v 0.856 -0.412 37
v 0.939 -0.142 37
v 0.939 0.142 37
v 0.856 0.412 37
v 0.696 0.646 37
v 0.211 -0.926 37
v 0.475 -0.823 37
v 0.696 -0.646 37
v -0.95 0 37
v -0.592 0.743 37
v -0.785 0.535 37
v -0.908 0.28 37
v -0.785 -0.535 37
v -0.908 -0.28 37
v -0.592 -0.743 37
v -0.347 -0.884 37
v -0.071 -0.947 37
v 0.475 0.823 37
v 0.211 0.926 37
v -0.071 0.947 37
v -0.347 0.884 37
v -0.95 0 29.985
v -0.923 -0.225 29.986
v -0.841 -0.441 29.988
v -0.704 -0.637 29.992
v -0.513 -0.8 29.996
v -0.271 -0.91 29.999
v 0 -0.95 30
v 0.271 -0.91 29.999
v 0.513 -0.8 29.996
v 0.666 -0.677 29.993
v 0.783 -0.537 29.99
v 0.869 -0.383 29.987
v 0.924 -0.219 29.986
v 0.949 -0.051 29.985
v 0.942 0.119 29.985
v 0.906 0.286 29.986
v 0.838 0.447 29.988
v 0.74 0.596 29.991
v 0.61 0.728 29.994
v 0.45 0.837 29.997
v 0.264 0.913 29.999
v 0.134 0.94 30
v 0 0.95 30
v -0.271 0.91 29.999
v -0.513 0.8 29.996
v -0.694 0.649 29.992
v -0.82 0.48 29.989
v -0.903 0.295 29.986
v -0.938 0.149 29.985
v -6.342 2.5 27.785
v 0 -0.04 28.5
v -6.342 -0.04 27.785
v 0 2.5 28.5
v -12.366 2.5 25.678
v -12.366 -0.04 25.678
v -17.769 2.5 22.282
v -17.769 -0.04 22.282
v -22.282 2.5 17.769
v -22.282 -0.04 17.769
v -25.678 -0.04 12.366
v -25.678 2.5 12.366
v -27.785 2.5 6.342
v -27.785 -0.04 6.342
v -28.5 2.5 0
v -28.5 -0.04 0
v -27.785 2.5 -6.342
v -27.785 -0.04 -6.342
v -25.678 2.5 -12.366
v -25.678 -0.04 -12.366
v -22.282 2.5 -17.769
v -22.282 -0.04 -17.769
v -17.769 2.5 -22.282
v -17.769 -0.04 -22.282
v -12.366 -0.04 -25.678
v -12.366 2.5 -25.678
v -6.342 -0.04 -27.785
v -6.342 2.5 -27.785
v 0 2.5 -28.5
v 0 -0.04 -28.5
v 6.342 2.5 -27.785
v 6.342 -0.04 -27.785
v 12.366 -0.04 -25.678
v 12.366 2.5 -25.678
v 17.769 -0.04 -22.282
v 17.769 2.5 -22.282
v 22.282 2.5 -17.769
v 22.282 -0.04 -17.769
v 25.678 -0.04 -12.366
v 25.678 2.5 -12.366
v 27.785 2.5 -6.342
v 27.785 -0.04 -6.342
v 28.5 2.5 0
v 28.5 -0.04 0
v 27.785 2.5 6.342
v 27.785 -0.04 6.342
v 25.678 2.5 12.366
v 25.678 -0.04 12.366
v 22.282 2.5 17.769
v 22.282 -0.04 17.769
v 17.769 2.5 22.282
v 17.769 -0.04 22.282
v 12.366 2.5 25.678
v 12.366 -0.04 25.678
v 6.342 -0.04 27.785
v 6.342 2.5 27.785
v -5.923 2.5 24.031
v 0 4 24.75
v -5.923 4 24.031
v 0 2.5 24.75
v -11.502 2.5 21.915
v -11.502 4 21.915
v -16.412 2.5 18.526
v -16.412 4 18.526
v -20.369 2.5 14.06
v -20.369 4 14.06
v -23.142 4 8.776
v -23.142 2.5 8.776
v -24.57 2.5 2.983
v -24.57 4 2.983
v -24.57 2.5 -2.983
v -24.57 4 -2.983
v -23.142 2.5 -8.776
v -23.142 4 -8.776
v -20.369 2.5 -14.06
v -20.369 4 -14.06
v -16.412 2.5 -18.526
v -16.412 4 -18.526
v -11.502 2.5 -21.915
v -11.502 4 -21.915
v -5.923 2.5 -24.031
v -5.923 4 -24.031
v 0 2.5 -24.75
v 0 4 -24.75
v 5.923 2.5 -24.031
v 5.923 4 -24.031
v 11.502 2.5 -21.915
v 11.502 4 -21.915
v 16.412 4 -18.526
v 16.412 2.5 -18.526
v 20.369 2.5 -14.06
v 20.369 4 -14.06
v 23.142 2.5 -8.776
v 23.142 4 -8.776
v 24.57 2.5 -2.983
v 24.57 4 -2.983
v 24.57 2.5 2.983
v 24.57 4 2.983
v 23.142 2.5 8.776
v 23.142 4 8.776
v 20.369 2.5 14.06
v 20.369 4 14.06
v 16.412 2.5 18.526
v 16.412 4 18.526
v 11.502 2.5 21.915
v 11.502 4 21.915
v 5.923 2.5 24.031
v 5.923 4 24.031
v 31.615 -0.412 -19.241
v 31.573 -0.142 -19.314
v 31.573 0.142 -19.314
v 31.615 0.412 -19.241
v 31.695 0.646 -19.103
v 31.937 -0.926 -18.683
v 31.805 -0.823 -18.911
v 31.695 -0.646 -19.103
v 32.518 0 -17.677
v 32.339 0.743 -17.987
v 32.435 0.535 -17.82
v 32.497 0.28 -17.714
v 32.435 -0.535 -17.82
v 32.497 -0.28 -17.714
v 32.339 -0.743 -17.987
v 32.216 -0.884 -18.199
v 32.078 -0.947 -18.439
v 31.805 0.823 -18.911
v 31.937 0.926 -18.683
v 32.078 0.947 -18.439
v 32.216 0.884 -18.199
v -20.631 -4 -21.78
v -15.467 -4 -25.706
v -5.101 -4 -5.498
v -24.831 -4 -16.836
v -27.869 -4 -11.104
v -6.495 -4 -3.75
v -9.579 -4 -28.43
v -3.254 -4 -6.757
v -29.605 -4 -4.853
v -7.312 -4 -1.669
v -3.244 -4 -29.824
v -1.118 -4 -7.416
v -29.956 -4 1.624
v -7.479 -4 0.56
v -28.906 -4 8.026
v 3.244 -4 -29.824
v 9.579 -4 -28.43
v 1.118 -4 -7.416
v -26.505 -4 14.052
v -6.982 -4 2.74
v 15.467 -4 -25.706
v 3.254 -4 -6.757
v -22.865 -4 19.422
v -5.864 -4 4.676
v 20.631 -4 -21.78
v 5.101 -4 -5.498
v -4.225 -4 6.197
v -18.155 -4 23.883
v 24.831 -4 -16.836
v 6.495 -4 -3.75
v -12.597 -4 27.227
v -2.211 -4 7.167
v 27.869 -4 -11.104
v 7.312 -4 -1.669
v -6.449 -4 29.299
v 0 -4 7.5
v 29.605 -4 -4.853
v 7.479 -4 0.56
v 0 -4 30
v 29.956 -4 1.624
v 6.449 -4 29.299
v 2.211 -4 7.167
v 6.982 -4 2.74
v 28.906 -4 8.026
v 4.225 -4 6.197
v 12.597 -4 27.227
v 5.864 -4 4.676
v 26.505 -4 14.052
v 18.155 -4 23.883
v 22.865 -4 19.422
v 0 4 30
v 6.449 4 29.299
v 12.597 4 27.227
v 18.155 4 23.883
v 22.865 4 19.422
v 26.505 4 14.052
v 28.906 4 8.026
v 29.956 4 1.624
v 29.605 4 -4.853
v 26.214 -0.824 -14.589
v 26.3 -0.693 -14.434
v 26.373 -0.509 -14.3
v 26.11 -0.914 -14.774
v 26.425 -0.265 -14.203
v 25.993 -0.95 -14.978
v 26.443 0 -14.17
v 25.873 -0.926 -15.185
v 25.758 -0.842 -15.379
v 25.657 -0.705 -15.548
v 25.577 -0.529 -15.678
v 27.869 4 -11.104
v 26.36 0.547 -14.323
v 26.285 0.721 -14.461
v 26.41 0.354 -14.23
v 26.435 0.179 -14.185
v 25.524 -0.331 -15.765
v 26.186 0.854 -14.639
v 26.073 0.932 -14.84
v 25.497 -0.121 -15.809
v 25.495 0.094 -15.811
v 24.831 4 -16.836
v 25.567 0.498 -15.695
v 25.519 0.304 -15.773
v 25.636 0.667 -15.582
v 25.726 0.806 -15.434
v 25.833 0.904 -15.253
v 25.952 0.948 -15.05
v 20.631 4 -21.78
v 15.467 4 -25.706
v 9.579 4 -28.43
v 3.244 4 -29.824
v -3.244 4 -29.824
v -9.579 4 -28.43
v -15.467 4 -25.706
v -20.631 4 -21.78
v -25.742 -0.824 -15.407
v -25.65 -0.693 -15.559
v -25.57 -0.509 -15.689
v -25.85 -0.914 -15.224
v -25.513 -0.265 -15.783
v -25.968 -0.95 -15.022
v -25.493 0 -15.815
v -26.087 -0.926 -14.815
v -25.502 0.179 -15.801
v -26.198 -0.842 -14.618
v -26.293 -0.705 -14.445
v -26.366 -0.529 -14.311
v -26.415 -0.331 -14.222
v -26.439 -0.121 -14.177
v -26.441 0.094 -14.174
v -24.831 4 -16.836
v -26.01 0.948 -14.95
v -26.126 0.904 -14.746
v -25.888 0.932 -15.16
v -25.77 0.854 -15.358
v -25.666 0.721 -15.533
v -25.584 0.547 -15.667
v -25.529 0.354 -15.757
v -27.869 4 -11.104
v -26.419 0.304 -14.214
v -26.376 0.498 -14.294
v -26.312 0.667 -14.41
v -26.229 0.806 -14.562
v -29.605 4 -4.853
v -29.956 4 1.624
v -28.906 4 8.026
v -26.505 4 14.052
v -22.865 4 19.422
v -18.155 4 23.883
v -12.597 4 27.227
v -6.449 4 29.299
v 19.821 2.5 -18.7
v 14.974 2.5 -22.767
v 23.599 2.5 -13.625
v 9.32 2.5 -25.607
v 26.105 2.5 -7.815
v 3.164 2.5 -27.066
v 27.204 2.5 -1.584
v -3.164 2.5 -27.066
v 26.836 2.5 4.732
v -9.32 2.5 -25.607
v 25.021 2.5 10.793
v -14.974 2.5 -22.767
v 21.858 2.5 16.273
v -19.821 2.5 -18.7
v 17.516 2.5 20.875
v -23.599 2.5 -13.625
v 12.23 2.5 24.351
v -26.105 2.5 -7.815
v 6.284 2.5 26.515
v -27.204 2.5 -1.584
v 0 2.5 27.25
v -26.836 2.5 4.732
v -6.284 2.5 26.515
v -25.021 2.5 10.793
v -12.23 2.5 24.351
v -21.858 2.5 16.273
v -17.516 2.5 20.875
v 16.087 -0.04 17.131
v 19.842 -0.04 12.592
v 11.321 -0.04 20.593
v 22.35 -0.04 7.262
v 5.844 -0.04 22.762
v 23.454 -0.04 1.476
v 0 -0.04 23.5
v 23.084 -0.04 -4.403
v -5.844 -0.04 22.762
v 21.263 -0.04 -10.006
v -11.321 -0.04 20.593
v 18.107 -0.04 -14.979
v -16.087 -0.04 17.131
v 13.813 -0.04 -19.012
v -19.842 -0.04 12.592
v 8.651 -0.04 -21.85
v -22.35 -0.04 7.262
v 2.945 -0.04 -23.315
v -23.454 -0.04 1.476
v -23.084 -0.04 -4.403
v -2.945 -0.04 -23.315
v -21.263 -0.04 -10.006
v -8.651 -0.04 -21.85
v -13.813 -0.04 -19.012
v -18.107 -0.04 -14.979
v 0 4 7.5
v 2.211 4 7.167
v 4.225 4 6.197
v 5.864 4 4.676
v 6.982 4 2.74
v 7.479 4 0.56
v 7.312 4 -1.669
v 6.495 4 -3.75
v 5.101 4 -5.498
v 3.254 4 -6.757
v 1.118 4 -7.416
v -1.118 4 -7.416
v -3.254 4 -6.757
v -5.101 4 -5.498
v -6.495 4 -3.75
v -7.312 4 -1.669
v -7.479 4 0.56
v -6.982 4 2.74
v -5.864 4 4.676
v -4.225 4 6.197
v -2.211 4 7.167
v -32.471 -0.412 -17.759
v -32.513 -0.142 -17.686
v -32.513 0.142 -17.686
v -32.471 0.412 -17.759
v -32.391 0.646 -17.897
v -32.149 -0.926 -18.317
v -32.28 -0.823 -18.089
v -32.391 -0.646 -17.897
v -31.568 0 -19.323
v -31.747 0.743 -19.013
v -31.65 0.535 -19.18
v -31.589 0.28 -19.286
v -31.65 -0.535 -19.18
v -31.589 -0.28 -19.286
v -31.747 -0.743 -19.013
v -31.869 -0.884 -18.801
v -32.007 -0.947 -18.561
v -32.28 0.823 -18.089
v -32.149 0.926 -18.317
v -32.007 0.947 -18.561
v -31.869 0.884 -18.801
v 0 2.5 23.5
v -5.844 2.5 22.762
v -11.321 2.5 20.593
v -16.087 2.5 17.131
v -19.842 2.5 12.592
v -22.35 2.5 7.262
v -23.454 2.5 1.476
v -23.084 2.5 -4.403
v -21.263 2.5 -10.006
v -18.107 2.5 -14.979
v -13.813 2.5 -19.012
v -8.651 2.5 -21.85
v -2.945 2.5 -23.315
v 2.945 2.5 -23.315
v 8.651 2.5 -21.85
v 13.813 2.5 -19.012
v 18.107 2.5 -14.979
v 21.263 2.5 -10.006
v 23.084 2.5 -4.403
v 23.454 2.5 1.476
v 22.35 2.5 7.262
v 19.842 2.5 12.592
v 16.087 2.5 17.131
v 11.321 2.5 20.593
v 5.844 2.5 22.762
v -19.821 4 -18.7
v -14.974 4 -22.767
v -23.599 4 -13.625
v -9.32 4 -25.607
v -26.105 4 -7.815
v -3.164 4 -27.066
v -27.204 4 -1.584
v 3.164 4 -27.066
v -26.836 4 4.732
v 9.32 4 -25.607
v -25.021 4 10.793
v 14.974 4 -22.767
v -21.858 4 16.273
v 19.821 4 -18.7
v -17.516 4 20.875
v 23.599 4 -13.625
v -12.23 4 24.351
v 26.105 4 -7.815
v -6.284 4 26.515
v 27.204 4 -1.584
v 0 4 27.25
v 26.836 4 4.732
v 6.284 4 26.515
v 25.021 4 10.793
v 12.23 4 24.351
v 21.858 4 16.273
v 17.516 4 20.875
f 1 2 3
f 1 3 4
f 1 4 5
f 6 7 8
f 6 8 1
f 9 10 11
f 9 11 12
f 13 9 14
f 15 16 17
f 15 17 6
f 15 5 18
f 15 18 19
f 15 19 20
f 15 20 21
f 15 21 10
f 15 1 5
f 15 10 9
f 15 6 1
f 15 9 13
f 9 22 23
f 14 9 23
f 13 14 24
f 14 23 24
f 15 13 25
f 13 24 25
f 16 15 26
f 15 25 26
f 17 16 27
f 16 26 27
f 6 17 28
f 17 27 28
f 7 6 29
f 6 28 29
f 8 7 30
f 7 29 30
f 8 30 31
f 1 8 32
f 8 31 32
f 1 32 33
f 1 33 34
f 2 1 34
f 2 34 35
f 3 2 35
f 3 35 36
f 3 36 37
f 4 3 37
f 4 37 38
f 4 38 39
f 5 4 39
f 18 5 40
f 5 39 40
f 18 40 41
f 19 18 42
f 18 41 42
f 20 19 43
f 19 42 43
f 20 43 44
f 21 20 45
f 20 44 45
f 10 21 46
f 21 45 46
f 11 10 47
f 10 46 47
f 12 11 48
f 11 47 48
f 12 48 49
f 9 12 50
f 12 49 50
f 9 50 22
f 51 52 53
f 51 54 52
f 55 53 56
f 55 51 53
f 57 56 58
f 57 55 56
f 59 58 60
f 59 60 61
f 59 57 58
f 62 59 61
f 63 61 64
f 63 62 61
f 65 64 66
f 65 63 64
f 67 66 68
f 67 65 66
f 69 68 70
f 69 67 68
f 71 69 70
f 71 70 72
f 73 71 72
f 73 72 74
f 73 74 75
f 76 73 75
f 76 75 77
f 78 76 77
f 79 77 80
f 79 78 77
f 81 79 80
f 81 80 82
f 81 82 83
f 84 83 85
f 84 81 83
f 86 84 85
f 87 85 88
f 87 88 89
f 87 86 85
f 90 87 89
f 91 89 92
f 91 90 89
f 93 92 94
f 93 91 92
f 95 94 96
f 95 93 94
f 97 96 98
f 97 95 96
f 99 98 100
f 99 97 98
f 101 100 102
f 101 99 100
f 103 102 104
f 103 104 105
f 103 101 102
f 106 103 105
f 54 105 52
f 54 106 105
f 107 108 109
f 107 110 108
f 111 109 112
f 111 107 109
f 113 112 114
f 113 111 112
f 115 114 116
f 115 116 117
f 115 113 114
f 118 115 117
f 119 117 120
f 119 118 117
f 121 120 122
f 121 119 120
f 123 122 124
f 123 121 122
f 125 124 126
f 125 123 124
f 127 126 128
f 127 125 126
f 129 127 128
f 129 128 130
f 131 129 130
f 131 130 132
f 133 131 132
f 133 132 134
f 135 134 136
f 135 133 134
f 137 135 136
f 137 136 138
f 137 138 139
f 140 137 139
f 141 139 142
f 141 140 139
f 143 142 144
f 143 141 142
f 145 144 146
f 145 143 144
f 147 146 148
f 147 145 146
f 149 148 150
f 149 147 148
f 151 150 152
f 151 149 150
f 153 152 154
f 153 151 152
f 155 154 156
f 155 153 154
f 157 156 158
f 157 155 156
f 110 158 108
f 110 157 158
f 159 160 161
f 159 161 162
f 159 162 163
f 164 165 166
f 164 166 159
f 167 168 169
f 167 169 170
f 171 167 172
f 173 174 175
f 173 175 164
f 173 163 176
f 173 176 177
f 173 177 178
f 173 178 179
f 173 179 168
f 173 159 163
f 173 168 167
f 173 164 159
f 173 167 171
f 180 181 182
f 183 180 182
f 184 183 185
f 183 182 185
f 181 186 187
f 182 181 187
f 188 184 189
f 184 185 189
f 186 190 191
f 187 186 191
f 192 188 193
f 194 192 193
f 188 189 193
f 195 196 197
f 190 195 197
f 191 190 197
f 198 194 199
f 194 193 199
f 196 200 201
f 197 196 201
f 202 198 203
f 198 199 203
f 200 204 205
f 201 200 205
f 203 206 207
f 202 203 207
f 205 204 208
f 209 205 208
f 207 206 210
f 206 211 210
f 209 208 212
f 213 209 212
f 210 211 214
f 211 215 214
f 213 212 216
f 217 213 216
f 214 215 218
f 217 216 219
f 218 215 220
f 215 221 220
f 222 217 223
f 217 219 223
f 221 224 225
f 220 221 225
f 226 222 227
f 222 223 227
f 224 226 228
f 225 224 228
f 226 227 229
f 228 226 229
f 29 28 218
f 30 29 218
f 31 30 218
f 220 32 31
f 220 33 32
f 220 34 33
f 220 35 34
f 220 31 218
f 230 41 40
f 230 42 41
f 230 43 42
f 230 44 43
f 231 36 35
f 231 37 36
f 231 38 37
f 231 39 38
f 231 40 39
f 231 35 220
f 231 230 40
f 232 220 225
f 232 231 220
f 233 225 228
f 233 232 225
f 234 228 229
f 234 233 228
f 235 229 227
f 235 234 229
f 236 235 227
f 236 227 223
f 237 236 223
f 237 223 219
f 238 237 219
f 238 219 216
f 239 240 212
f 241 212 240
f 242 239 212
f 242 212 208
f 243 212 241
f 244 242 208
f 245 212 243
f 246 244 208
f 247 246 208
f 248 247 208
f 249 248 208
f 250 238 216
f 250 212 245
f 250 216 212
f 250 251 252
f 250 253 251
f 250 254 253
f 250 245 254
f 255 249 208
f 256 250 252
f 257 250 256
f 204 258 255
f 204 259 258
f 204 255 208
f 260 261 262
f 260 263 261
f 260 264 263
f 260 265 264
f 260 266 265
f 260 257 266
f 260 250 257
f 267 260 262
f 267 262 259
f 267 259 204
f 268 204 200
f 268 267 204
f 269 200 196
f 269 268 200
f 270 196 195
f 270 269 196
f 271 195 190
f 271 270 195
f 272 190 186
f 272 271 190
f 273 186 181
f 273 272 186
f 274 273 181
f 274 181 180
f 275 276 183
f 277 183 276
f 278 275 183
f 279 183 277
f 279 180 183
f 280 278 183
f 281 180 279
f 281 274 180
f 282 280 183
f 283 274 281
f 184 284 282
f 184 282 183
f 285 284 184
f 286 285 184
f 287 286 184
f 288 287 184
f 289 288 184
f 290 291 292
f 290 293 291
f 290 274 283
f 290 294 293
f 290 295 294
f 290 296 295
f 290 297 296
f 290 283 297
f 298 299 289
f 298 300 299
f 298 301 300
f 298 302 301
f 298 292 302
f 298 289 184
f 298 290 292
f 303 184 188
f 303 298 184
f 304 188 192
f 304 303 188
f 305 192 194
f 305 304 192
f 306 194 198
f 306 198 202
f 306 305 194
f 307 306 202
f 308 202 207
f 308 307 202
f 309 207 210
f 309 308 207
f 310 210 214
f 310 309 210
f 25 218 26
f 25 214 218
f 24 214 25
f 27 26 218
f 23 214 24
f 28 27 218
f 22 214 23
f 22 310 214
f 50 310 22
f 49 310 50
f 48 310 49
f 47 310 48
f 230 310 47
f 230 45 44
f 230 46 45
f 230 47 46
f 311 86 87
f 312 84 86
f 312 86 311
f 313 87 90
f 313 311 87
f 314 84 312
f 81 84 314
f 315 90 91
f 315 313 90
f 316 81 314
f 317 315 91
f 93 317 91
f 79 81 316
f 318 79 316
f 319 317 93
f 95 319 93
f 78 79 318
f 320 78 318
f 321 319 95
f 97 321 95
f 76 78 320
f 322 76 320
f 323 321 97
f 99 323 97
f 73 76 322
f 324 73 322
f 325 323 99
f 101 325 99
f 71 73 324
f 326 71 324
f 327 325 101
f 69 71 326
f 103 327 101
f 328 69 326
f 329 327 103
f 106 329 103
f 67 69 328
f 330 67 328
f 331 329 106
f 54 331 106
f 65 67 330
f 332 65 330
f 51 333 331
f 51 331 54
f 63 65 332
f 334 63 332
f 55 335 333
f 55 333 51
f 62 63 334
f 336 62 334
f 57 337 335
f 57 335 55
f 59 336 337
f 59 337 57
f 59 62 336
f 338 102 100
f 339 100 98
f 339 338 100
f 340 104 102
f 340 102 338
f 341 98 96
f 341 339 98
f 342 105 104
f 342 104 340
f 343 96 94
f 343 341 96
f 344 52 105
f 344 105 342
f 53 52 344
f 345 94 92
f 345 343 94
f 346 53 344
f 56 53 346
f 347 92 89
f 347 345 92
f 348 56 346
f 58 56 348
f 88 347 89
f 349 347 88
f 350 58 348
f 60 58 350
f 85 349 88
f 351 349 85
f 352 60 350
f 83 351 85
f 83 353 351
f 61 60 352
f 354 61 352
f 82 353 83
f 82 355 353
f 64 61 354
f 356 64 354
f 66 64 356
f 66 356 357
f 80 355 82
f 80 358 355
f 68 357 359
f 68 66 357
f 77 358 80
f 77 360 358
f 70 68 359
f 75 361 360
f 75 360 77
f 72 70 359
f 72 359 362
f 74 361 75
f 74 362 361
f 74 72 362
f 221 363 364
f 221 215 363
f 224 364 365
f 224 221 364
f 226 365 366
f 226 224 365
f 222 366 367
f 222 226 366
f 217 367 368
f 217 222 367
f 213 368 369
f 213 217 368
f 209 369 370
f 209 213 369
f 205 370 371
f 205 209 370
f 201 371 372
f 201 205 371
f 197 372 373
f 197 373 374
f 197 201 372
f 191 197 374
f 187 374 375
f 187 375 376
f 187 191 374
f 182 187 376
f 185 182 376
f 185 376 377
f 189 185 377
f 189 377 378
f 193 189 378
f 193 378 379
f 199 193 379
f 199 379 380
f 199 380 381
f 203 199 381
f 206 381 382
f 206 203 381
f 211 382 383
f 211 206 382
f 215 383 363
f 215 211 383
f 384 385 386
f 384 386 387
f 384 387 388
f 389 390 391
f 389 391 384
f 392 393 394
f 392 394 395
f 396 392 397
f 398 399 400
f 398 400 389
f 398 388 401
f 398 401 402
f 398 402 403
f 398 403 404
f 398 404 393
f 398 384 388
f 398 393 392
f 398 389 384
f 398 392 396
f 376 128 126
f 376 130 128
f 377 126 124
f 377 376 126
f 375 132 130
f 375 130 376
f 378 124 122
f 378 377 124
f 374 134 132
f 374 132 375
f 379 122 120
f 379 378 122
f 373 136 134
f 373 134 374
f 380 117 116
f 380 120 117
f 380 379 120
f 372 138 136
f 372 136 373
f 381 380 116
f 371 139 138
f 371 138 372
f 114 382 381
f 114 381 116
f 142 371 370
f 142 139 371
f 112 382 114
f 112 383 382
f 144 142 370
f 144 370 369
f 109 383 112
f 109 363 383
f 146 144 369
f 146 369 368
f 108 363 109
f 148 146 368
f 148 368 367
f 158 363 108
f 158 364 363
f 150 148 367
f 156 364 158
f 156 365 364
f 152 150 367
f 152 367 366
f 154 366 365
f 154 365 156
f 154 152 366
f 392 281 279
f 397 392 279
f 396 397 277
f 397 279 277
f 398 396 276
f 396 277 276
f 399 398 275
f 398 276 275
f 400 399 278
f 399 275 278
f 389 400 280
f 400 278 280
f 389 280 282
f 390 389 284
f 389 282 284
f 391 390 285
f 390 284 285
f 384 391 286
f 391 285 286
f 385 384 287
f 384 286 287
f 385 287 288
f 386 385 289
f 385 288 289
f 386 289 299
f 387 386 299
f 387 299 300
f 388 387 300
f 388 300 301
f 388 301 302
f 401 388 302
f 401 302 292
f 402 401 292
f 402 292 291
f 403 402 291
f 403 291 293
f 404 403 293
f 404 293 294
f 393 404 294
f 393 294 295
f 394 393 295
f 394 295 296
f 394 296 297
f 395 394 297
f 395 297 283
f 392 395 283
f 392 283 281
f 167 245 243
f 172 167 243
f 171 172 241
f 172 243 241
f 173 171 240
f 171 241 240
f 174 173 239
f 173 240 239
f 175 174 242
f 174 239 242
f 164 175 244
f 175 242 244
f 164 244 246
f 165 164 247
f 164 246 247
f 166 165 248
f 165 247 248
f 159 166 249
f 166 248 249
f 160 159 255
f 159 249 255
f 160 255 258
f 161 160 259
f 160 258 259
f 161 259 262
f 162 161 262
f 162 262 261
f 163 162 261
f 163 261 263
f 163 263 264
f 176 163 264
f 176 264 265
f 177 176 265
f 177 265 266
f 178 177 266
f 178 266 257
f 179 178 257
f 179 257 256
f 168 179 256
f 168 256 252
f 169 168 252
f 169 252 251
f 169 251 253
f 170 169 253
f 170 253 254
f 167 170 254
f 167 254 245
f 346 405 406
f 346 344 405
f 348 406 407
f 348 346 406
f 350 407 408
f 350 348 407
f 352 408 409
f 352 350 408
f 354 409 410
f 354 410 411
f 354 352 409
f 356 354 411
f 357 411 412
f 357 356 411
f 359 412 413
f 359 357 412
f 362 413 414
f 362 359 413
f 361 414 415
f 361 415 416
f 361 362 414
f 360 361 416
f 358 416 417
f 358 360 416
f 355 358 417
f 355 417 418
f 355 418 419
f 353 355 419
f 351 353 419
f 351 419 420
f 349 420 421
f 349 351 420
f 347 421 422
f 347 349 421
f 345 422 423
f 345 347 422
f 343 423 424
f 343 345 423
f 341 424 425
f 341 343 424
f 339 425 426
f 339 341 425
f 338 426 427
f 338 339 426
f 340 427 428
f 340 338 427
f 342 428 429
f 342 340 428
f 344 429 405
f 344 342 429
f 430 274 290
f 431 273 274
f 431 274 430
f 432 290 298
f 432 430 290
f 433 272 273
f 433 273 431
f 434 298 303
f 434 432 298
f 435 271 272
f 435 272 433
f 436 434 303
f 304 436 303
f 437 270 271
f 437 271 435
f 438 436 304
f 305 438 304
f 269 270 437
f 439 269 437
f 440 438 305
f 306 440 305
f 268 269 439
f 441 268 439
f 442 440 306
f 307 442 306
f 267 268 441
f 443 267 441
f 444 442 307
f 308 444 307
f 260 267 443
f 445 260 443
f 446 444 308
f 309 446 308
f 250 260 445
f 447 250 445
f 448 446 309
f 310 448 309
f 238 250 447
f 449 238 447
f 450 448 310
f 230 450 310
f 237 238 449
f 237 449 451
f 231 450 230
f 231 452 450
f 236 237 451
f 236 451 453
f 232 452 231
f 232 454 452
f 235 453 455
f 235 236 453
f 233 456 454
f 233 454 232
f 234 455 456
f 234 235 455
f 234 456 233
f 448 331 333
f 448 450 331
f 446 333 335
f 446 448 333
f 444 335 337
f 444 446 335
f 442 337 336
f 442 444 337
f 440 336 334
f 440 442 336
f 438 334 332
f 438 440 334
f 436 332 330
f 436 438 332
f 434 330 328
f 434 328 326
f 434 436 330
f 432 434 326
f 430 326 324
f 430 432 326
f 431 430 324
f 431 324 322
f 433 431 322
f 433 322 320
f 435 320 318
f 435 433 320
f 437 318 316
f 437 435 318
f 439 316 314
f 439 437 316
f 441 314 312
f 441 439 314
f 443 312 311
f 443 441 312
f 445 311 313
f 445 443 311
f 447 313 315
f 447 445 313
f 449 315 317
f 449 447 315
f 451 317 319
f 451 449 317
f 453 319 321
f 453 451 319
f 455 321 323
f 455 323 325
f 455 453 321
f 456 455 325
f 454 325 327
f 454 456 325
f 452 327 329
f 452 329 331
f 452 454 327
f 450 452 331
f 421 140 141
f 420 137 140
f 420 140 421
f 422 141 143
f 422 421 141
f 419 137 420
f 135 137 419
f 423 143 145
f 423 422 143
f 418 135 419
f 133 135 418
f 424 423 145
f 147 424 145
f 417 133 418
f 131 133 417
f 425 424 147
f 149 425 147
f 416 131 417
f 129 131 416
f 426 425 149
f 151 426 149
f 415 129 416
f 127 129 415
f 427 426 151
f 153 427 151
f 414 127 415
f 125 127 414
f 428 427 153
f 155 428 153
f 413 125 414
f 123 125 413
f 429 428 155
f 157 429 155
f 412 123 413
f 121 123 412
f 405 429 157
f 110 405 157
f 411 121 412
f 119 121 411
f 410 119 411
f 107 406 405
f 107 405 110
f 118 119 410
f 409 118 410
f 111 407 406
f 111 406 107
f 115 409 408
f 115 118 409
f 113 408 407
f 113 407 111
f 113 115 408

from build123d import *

# Parameters (mm, degrees)
SKETCH1_R           = 30
SKETCH1_R_2         = 7.5
BOSS_EXTRUDE1_DEPTH = 4
BOSS_EXTRUDE2_START = 29
SKETCH3_R           = 0.95
BOSS_EXTRUDE2_DEPTH = 8
CIRPATTERN1_COUNT   = 3


with BuildPart() as part:
    # Sketch1 → Boss-Extrude1 (new, symmetric)
    with BuildSketch(Plane(origin=(0, 0, 0), x_dir=(1, 0, 0), z_dir=(0, 1, 0))):
        with Locations(Location((0, 0, 0), (0, 0, 270))):
            Circle(SKETCH1_R)
        with Locations(Location((0, 0, 0), (0, 0, 270))):
            Circle(SKETCH1_R_2, mode=Mode.SUBTRACT)
    extrude(amount=BOSS_EXTRUDE1_DEPTH, both=True)

    # Sketch2 → Cut-Revolve2 (revolve, cut)
    with BuildSketch(Plane(origin=(0, 0, 0), x_dir=(0, 0, -1), z_dir=(1, 0, 0))):
        Polygon((-27.25, 4), (-24.75, 4), (-24.75, 2.5), (-23.5, 2.5), (-23.5, -0.04), (-28.5, -0.04), (-28.5, 2.5), (-27.25, 2.5), align=None)
    revolve(axis=Axis((0, 8.260026976, 0), (0, -1, 0)), mode=Mode.SUBTRACT)

    # Sketch3 → Boss-Extrude2 (add)
    with BuildSketch(Plane.XY.offset(BOSS_EXTRUDE2_START)):
        with Locations(Location((0, 0, 0), (0, 0, 180))):
            Circle(SKETCH3_R)
    boss_extrude2 = extrude(amount=BOSS_EXTRUDE2_DEPTH)

    # CirPattern1: Boss-Extrude2 ×3 about axis
    cirpattern1_axis = Axis((0, 0, 0), (0, 1, 0))
    for i in range(1, CIRPATTERN1_COUNT):
        add(boss_extrude2.rotate(cirpattern1_axis, i * 360 / CIRPATTERN1_COUNT))


solid = part.part
